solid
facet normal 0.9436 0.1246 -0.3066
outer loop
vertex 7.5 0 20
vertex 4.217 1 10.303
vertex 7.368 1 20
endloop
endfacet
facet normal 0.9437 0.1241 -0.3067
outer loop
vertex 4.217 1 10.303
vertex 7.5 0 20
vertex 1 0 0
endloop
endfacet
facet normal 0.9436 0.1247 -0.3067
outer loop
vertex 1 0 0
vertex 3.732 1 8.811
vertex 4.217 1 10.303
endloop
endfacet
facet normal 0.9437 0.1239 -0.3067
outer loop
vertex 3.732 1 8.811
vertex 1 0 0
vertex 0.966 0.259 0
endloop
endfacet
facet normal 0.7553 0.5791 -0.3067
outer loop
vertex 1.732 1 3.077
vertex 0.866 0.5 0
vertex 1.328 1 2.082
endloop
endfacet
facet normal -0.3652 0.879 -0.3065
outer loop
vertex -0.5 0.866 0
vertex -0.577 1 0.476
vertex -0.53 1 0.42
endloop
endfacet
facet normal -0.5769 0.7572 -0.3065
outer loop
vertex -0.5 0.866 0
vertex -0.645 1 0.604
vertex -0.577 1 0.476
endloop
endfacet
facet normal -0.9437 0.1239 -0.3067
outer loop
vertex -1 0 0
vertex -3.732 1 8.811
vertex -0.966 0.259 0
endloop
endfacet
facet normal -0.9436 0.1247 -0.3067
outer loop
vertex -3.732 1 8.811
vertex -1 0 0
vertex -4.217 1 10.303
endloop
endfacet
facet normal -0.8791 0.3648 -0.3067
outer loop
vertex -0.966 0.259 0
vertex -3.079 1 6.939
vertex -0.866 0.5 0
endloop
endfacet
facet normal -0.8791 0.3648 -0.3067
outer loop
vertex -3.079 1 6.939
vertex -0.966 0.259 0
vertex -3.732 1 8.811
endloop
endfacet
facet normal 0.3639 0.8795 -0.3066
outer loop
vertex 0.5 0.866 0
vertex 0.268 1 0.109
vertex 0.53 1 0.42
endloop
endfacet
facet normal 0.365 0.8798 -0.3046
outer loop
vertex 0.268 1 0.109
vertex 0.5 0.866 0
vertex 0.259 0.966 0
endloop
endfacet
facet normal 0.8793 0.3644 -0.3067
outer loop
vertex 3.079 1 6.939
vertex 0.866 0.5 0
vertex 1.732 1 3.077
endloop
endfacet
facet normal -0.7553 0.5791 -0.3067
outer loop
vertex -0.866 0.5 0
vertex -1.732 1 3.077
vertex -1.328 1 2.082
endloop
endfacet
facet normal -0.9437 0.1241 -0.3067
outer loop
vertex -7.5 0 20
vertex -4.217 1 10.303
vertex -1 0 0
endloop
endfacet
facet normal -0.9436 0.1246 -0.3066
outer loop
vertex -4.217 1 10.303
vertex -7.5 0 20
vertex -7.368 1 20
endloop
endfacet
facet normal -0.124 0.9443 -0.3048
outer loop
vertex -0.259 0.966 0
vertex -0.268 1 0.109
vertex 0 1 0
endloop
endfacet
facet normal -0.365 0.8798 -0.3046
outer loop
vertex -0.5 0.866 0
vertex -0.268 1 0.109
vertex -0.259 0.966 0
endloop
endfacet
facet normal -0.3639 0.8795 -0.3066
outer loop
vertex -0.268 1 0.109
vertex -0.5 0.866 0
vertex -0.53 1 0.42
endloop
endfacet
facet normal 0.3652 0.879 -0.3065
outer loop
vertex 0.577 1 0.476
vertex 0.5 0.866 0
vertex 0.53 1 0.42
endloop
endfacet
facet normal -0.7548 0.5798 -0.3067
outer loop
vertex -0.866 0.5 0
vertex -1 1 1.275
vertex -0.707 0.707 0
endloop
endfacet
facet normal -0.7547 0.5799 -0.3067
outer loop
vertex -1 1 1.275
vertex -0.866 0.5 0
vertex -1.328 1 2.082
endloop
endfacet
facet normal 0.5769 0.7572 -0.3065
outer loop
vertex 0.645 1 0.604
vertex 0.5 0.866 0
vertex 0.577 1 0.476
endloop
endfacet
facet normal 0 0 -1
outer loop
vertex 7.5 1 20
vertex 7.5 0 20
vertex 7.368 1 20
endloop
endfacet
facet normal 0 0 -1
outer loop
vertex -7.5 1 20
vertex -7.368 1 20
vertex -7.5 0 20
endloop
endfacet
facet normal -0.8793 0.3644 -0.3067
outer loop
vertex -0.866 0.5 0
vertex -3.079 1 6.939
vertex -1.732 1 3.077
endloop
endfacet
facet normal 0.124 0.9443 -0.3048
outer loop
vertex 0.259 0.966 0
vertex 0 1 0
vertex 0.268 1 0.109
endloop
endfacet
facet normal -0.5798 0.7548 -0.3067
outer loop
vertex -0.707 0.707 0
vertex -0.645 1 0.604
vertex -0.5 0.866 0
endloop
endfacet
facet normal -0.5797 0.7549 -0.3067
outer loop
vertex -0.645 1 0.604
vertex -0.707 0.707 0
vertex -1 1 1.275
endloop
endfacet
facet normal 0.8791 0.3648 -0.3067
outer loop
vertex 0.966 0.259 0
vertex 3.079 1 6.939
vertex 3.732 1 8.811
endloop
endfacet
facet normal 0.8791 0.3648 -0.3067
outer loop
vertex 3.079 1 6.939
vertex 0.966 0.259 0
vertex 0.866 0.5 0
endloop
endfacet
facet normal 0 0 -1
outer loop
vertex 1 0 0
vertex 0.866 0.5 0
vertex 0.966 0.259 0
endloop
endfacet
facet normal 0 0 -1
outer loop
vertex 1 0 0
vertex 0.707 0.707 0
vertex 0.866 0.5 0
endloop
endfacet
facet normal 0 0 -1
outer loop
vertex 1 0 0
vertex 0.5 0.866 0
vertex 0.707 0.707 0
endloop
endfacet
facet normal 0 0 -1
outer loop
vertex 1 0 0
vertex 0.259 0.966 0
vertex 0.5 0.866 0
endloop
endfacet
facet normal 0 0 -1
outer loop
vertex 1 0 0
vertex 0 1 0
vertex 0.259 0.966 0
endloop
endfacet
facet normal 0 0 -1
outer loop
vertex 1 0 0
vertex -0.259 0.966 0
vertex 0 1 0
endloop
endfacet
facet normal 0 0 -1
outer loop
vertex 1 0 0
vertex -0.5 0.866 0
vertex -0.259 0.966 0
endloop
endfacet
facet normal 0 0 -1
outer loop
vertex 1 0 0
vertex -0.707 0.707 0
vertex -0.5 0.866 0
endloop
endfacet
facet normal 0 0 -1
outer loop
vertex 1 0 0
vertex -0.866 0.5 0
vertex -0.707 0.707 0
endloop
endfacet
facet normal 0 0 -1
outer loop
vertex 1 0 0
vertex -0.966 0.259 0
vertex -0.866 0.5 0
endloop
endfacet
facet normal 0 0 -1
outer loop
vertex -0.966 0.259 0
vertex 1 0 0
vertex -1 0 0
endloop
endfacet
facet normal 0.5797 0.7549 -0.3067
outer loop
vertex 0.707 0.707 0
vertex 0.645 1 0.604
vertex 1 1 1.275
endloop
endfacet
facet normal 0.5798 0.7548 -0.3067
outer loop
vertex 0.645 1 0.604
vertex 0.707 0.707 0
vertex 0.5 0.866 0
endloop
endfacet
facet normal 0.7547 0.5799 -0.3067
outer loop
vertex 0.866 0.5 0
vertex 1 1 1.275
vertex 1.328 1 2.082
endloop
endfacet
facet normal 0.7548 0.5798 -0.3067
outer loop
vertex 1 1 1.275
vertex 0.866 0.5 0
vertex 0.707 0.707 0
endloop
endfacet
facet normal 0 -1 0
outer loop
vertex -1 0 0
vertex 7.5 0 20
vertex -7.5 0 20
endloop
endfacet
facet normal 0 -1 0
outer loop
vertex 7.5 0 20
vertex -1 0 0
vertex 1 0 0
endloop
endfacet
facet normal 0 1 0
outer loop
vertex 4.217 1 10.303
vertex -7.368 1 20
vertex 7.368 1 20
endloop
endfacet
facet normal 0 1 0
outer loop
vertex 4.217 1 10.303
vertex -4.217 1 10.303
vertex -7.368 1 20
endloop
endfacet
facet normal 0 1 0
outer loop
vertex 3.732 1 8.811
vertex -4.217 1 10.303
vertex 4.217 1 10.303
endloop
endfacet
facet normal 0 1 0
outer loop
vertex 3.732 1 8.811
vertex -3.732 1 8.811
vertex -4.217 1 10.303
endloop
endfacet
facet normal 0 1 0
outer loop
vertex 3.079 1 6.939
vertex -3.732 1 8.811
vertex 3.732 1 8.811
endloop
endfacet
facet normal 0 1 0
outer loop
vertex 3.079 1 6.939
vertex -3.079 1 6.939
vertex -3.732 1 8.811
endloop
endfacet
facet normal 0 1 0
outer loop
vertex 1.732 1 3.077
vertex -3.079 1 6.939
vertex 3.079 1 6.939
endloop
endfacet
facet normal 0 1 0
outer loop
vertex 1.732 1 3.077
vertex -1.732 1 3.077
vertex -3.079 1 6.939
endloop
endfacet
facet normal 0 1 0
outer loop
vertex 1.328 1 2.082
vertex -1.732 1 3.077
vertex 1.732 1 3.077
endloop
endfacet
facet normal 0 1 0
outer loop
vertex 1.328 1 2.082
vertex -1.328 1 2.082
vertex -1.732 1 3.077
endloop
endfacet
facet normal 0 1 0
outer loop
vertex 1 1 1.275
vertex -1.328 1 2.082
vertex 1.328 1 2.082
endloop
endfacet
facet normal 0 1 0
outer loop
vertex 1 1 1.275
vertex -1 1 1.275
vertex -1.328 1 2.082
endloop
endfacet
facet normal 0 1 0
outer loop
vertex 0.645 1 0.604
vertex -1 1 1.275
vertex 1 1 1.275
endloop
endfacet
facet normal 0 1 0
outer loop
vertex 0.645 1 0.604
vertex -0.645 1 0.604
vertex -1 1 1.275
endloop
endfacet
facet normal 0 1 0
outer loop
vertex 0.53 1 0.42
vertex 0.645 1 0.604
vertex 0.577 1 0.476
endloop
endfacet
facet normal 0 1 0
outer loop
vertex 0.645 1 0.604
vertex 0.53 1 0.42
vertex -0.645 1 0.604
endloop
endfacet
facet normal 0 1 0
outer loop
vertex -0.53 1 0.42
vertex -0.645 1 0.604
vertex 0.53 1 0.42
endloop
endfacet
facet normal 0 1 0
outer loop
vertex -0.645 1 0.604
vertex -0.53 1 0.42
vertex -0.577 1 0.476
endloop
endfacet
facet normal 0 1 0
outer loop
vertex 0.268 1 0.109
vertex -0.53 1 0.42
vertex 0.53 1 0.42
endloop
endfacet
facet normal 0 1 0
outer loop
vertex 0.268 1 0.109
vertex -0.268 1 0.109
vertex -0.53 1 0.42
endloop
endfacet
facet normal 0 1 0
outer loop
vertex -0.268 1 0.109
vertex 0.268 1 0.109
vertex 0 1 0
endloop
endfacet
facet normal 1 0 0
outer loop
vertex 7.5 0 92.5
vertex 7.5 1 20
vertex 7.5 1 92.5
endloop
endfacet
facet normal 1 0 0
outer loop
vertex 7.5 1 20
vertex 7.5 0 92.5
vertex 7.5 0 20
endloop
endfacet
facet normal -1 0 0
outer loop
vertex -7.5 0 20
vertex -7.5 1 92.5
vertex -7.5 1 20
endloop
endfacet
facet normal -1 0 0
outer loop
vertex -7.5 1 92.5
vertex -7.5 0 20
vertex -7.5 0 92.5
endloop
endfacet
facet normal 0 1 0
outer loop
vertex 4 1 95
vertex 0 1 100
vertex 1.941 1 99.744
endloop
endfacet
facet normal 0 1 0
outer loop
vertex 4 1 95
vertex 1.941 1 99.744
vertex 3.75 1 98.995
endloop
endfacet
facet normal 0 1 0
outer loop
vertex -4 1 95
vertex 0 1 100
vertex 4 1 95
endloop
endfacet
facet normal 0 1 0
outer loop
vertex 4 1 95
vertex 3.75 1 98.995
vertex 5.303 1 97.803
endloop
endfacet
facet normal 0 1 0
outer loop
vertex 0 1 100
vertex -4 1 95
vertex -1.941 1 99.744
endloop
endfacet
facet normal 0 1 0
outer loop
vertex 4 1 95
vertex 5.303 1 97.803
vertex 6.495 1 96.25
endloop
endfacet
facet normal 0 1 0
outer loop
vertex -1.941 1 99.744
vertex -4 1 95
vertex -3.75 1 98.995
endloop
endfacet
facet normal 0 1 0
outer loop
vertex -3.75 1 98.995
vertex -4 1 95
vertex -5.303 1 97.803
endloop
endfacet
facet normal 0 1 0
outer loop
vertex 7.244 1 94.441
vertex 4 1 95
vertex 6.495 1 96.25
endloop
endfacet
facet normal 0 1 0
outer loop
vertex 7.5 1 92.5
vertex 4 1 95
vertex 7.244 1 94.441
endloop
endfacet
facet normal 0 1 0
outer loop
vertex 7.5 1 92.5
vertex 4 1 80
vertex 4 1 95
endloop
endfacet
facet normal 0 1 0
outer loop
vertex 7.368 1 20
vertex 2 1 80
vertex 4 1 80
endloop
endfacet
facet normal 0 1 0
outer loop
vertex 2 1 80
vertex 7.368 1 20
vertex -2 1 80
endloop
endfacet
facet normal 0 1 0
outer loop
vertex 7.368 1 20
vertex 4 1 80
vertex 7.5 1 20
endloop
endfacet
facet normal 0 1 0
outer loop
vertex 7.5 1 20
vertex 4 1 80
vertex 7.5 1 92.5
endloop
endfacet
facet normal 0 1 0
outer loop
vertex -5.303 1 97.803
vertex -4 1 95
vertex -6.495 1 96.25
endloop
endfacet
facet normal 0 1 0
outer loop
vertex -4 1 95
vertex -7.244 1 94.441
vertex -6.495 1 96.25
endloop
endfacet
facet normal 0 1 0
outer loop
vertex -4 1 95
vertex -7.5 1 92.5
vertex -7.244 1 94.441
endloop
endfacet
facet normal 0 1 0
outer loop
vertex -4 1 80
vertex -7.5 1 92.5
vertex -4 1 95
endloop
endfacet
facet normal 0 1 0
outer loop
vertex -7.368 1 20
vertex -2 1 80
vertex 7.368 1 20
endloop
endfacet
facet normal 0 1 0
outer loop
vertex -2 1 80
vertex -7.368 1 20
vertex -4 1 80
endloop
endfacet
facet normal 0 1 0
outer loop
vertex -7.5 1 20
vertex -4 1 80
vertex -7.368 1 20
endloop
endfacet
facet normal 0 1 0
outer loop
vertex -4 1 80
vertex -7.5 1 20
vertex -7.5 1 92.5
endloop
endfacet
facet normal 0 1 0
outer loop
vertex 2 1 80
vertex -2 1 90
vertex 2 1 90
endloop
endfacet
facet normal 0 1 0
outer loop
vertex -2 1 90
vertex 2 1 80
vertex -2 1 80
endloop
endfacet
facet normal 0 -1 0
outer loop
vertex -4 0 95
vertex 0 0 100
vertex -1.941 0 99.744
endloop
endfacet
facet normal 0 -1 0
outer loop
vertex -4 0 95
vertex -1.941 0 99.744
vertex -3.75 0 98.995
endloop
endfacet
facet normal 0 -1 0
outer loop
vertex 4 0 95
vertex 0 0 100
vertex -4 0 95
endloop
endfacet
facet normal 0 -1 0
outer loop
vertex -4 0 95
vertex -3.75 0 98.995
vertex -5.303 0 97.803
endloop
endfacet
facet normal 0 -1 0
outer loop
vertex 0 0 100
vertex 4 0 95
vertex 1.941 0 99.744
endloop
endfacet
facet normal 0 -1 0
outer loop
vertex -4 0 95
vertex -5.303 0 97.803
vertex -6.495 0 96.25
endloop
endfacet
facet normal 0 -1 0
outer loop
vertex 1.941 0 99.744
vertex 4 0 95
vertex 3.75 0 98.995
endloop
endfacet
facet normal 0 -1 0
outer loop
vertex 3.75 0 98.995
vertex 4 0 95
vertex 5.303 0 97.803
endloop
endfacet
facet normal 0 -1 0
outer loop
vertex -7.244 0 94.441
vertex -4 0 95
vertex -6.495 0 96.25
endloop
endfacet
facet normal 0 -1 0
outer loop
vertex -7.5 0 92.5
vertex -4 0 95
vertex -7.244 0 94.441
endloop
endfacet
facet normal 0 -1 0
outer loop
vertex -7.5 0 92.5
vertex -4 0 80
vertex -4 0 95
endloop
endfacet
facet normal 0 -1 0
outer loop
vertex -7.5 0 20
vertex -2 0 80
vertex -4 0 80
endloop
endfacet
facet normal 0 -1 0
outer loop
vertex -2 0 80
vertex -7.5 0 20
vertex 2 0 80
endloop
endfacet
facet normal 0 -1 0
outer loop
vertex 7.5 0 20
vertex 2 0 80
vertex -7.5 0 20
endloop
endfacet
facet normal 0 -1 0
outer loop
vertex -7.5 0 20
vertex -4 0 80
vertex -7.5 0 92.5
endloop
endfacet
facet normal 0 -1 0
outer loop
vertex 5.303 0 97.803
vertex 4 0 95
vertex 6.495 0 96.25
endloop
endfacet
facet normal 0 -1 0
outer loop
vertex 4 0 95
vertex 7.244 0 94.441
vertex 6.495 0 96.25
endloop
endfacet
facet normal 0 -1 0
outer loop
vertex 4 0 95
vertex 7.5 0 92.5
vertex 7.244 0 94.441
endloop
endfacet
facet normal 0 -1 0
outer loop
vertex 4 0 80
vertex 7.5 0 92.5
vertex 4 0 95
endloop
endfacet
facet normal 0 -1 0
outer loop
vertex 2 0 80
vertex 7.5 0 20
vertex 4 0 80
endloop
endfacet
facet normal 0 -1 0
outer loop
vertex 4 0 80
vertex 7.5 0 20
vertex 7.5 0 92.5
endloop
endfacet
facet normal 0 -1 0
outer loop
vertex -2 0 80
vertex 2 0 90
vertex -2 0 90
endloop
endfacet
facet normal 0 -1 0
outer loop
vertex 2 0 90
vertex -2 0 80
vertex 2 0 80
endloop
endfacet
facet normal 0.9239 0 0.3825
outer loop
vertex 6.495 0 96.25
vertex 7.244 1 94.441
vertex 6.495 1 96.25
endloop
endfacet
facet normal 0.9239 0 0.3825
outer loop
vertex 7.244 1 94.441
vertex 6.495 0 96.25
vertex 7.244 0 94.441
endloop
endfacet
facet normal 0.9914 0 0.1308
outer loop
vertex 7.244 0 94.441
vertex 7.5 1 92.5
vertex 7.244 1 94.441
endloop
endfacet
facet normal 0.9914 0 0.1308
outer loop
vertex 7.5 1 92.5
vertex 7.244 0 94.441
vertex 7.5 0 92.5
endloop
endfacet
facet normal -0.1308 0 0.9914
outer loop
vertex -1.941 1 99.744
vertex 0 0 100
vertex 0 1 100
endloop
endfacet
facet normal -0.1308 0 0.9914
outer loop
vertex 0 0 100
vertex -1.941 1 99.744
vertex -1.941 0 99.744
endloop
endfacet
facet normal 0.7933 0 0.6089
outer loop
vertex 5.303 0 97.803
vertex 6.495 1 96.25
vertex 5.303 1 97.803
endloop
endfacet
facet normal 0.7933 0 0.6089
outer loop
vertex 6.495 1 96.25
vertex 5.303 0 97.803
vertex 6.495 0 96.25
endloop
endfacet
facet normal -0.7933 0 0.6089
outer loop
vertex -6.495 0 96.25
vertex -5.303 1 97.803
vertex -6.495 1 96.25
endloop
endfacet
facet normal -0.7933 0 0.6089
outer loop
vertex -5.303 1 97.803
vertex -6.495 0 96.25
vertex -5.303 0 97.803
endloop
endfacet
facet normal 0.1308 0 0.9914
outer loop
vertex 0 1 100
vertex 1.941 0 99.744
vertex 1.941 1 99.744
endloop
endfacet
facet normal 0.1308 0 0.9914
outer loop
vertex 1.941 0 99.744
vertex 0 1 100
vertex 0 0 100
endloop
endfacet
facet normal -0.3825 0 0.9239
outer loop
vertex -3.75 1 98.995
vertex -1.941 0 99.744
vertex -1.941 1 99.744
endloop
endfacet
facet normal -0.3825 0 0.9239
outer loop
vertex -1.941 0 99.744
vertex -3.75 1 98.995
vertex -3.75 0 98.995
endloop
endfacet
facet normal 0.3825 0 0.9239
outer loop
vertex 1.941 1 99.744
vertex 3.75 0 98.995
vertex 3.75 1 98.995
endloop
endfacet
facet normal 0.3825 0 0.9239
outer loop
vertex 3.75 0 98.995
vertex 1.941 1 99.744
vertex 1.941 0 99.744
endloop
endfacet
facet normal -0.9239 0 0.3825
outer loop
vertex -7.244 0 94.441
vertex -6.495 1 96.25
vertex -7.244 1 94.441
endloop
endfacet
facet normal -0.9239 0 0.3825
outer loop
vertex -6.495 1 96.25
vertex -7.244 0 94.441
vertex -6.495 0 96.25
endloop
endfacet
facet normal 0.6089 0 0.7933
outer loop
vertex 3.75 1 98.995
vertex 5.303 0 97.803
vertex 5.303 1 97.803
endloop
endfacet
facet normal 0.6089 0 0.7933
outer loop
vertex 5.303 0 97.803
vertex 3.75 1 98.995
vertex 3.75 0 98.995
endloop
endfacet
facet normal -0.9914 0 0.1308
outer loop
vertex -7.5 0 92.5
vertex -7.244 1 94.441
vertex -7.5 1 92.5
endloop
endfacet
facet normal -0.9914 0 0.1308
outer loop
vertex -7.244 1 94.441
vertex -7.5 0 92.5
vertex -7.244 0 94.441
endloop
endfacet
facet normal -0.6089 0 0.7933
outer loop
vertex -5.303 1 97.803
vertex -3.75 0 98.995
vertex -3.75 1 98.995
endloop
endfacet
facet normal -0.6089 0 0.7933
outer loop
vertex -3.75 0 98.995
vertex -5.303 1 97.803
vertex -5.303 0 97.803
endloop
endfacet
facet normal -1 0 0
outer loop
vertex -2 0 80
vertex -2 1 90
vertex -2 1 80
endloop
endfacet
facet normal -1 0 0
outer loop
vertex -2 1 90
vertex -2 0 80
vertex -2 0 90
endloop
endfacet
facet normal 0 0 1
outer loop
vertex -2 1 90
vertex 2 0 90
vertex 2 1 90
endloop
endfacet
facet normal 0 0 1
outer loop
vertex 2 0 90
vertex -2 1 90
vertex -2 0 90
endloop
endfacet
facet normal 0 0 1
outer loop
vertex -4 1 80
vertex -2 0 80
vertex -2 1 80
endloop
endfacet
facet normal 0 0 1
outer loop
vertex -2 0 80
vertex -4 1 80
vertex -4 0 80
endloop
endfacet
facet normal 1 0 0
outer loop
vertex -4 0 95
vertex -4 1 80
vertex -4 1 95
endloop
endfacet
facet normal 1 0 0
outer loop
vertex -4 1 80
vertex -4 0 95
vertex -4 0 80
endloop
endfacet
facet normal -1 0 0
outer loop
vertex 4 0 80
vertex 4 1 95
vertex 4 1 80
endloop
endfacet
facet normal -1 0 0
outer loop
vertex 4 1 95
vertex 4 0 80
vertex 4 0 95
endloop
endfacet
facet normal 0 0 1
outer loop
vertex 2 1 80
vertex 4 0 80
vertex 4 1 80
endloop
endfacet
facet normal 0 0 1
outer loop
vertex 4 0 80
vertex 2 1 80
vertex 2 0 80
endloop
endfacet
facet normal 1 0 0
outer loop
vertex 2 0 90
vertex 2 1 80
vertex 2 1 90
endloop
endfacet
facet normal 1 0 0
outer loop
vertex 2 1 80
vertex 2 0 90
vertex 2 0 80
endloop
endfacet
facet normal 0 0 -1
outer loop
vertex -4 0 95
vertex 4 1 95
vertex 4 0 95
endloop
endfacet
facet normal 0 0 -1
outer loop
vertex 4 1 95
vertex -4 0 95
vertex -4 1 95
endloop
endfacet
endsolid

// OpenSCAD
width = 15;
height = 80;
thickness = 1;
lower_height = 20;
paper_holder = true;

module holder() {
    translate([-4,0,height]) cube([2,2,10]);
    translate([2,0,height]) cube([2,2,10]);
    translate([-4,0,height+10]) cube([8,2,5]);
}

difference (){
    cylinder(r1=1,r2=width/2, h=lower_height);
    translate([-width/2,-width,0]) cube([width,width,lower_height]);
    translate([-width/2,thickness,0]) cube([width,width,lower_height]);
}

module plate() {
    translate([-width/2,0,lower_height]) cube([width, thickness, height-width/2]);
    translate([0,thickness,height+lower_height-width/2]) rotate([90,0,0]) cylinder(r=width/2, h=thickness);
}

difference() {
    plate();
    if (paper_holder) {
        holder();
    }
}
